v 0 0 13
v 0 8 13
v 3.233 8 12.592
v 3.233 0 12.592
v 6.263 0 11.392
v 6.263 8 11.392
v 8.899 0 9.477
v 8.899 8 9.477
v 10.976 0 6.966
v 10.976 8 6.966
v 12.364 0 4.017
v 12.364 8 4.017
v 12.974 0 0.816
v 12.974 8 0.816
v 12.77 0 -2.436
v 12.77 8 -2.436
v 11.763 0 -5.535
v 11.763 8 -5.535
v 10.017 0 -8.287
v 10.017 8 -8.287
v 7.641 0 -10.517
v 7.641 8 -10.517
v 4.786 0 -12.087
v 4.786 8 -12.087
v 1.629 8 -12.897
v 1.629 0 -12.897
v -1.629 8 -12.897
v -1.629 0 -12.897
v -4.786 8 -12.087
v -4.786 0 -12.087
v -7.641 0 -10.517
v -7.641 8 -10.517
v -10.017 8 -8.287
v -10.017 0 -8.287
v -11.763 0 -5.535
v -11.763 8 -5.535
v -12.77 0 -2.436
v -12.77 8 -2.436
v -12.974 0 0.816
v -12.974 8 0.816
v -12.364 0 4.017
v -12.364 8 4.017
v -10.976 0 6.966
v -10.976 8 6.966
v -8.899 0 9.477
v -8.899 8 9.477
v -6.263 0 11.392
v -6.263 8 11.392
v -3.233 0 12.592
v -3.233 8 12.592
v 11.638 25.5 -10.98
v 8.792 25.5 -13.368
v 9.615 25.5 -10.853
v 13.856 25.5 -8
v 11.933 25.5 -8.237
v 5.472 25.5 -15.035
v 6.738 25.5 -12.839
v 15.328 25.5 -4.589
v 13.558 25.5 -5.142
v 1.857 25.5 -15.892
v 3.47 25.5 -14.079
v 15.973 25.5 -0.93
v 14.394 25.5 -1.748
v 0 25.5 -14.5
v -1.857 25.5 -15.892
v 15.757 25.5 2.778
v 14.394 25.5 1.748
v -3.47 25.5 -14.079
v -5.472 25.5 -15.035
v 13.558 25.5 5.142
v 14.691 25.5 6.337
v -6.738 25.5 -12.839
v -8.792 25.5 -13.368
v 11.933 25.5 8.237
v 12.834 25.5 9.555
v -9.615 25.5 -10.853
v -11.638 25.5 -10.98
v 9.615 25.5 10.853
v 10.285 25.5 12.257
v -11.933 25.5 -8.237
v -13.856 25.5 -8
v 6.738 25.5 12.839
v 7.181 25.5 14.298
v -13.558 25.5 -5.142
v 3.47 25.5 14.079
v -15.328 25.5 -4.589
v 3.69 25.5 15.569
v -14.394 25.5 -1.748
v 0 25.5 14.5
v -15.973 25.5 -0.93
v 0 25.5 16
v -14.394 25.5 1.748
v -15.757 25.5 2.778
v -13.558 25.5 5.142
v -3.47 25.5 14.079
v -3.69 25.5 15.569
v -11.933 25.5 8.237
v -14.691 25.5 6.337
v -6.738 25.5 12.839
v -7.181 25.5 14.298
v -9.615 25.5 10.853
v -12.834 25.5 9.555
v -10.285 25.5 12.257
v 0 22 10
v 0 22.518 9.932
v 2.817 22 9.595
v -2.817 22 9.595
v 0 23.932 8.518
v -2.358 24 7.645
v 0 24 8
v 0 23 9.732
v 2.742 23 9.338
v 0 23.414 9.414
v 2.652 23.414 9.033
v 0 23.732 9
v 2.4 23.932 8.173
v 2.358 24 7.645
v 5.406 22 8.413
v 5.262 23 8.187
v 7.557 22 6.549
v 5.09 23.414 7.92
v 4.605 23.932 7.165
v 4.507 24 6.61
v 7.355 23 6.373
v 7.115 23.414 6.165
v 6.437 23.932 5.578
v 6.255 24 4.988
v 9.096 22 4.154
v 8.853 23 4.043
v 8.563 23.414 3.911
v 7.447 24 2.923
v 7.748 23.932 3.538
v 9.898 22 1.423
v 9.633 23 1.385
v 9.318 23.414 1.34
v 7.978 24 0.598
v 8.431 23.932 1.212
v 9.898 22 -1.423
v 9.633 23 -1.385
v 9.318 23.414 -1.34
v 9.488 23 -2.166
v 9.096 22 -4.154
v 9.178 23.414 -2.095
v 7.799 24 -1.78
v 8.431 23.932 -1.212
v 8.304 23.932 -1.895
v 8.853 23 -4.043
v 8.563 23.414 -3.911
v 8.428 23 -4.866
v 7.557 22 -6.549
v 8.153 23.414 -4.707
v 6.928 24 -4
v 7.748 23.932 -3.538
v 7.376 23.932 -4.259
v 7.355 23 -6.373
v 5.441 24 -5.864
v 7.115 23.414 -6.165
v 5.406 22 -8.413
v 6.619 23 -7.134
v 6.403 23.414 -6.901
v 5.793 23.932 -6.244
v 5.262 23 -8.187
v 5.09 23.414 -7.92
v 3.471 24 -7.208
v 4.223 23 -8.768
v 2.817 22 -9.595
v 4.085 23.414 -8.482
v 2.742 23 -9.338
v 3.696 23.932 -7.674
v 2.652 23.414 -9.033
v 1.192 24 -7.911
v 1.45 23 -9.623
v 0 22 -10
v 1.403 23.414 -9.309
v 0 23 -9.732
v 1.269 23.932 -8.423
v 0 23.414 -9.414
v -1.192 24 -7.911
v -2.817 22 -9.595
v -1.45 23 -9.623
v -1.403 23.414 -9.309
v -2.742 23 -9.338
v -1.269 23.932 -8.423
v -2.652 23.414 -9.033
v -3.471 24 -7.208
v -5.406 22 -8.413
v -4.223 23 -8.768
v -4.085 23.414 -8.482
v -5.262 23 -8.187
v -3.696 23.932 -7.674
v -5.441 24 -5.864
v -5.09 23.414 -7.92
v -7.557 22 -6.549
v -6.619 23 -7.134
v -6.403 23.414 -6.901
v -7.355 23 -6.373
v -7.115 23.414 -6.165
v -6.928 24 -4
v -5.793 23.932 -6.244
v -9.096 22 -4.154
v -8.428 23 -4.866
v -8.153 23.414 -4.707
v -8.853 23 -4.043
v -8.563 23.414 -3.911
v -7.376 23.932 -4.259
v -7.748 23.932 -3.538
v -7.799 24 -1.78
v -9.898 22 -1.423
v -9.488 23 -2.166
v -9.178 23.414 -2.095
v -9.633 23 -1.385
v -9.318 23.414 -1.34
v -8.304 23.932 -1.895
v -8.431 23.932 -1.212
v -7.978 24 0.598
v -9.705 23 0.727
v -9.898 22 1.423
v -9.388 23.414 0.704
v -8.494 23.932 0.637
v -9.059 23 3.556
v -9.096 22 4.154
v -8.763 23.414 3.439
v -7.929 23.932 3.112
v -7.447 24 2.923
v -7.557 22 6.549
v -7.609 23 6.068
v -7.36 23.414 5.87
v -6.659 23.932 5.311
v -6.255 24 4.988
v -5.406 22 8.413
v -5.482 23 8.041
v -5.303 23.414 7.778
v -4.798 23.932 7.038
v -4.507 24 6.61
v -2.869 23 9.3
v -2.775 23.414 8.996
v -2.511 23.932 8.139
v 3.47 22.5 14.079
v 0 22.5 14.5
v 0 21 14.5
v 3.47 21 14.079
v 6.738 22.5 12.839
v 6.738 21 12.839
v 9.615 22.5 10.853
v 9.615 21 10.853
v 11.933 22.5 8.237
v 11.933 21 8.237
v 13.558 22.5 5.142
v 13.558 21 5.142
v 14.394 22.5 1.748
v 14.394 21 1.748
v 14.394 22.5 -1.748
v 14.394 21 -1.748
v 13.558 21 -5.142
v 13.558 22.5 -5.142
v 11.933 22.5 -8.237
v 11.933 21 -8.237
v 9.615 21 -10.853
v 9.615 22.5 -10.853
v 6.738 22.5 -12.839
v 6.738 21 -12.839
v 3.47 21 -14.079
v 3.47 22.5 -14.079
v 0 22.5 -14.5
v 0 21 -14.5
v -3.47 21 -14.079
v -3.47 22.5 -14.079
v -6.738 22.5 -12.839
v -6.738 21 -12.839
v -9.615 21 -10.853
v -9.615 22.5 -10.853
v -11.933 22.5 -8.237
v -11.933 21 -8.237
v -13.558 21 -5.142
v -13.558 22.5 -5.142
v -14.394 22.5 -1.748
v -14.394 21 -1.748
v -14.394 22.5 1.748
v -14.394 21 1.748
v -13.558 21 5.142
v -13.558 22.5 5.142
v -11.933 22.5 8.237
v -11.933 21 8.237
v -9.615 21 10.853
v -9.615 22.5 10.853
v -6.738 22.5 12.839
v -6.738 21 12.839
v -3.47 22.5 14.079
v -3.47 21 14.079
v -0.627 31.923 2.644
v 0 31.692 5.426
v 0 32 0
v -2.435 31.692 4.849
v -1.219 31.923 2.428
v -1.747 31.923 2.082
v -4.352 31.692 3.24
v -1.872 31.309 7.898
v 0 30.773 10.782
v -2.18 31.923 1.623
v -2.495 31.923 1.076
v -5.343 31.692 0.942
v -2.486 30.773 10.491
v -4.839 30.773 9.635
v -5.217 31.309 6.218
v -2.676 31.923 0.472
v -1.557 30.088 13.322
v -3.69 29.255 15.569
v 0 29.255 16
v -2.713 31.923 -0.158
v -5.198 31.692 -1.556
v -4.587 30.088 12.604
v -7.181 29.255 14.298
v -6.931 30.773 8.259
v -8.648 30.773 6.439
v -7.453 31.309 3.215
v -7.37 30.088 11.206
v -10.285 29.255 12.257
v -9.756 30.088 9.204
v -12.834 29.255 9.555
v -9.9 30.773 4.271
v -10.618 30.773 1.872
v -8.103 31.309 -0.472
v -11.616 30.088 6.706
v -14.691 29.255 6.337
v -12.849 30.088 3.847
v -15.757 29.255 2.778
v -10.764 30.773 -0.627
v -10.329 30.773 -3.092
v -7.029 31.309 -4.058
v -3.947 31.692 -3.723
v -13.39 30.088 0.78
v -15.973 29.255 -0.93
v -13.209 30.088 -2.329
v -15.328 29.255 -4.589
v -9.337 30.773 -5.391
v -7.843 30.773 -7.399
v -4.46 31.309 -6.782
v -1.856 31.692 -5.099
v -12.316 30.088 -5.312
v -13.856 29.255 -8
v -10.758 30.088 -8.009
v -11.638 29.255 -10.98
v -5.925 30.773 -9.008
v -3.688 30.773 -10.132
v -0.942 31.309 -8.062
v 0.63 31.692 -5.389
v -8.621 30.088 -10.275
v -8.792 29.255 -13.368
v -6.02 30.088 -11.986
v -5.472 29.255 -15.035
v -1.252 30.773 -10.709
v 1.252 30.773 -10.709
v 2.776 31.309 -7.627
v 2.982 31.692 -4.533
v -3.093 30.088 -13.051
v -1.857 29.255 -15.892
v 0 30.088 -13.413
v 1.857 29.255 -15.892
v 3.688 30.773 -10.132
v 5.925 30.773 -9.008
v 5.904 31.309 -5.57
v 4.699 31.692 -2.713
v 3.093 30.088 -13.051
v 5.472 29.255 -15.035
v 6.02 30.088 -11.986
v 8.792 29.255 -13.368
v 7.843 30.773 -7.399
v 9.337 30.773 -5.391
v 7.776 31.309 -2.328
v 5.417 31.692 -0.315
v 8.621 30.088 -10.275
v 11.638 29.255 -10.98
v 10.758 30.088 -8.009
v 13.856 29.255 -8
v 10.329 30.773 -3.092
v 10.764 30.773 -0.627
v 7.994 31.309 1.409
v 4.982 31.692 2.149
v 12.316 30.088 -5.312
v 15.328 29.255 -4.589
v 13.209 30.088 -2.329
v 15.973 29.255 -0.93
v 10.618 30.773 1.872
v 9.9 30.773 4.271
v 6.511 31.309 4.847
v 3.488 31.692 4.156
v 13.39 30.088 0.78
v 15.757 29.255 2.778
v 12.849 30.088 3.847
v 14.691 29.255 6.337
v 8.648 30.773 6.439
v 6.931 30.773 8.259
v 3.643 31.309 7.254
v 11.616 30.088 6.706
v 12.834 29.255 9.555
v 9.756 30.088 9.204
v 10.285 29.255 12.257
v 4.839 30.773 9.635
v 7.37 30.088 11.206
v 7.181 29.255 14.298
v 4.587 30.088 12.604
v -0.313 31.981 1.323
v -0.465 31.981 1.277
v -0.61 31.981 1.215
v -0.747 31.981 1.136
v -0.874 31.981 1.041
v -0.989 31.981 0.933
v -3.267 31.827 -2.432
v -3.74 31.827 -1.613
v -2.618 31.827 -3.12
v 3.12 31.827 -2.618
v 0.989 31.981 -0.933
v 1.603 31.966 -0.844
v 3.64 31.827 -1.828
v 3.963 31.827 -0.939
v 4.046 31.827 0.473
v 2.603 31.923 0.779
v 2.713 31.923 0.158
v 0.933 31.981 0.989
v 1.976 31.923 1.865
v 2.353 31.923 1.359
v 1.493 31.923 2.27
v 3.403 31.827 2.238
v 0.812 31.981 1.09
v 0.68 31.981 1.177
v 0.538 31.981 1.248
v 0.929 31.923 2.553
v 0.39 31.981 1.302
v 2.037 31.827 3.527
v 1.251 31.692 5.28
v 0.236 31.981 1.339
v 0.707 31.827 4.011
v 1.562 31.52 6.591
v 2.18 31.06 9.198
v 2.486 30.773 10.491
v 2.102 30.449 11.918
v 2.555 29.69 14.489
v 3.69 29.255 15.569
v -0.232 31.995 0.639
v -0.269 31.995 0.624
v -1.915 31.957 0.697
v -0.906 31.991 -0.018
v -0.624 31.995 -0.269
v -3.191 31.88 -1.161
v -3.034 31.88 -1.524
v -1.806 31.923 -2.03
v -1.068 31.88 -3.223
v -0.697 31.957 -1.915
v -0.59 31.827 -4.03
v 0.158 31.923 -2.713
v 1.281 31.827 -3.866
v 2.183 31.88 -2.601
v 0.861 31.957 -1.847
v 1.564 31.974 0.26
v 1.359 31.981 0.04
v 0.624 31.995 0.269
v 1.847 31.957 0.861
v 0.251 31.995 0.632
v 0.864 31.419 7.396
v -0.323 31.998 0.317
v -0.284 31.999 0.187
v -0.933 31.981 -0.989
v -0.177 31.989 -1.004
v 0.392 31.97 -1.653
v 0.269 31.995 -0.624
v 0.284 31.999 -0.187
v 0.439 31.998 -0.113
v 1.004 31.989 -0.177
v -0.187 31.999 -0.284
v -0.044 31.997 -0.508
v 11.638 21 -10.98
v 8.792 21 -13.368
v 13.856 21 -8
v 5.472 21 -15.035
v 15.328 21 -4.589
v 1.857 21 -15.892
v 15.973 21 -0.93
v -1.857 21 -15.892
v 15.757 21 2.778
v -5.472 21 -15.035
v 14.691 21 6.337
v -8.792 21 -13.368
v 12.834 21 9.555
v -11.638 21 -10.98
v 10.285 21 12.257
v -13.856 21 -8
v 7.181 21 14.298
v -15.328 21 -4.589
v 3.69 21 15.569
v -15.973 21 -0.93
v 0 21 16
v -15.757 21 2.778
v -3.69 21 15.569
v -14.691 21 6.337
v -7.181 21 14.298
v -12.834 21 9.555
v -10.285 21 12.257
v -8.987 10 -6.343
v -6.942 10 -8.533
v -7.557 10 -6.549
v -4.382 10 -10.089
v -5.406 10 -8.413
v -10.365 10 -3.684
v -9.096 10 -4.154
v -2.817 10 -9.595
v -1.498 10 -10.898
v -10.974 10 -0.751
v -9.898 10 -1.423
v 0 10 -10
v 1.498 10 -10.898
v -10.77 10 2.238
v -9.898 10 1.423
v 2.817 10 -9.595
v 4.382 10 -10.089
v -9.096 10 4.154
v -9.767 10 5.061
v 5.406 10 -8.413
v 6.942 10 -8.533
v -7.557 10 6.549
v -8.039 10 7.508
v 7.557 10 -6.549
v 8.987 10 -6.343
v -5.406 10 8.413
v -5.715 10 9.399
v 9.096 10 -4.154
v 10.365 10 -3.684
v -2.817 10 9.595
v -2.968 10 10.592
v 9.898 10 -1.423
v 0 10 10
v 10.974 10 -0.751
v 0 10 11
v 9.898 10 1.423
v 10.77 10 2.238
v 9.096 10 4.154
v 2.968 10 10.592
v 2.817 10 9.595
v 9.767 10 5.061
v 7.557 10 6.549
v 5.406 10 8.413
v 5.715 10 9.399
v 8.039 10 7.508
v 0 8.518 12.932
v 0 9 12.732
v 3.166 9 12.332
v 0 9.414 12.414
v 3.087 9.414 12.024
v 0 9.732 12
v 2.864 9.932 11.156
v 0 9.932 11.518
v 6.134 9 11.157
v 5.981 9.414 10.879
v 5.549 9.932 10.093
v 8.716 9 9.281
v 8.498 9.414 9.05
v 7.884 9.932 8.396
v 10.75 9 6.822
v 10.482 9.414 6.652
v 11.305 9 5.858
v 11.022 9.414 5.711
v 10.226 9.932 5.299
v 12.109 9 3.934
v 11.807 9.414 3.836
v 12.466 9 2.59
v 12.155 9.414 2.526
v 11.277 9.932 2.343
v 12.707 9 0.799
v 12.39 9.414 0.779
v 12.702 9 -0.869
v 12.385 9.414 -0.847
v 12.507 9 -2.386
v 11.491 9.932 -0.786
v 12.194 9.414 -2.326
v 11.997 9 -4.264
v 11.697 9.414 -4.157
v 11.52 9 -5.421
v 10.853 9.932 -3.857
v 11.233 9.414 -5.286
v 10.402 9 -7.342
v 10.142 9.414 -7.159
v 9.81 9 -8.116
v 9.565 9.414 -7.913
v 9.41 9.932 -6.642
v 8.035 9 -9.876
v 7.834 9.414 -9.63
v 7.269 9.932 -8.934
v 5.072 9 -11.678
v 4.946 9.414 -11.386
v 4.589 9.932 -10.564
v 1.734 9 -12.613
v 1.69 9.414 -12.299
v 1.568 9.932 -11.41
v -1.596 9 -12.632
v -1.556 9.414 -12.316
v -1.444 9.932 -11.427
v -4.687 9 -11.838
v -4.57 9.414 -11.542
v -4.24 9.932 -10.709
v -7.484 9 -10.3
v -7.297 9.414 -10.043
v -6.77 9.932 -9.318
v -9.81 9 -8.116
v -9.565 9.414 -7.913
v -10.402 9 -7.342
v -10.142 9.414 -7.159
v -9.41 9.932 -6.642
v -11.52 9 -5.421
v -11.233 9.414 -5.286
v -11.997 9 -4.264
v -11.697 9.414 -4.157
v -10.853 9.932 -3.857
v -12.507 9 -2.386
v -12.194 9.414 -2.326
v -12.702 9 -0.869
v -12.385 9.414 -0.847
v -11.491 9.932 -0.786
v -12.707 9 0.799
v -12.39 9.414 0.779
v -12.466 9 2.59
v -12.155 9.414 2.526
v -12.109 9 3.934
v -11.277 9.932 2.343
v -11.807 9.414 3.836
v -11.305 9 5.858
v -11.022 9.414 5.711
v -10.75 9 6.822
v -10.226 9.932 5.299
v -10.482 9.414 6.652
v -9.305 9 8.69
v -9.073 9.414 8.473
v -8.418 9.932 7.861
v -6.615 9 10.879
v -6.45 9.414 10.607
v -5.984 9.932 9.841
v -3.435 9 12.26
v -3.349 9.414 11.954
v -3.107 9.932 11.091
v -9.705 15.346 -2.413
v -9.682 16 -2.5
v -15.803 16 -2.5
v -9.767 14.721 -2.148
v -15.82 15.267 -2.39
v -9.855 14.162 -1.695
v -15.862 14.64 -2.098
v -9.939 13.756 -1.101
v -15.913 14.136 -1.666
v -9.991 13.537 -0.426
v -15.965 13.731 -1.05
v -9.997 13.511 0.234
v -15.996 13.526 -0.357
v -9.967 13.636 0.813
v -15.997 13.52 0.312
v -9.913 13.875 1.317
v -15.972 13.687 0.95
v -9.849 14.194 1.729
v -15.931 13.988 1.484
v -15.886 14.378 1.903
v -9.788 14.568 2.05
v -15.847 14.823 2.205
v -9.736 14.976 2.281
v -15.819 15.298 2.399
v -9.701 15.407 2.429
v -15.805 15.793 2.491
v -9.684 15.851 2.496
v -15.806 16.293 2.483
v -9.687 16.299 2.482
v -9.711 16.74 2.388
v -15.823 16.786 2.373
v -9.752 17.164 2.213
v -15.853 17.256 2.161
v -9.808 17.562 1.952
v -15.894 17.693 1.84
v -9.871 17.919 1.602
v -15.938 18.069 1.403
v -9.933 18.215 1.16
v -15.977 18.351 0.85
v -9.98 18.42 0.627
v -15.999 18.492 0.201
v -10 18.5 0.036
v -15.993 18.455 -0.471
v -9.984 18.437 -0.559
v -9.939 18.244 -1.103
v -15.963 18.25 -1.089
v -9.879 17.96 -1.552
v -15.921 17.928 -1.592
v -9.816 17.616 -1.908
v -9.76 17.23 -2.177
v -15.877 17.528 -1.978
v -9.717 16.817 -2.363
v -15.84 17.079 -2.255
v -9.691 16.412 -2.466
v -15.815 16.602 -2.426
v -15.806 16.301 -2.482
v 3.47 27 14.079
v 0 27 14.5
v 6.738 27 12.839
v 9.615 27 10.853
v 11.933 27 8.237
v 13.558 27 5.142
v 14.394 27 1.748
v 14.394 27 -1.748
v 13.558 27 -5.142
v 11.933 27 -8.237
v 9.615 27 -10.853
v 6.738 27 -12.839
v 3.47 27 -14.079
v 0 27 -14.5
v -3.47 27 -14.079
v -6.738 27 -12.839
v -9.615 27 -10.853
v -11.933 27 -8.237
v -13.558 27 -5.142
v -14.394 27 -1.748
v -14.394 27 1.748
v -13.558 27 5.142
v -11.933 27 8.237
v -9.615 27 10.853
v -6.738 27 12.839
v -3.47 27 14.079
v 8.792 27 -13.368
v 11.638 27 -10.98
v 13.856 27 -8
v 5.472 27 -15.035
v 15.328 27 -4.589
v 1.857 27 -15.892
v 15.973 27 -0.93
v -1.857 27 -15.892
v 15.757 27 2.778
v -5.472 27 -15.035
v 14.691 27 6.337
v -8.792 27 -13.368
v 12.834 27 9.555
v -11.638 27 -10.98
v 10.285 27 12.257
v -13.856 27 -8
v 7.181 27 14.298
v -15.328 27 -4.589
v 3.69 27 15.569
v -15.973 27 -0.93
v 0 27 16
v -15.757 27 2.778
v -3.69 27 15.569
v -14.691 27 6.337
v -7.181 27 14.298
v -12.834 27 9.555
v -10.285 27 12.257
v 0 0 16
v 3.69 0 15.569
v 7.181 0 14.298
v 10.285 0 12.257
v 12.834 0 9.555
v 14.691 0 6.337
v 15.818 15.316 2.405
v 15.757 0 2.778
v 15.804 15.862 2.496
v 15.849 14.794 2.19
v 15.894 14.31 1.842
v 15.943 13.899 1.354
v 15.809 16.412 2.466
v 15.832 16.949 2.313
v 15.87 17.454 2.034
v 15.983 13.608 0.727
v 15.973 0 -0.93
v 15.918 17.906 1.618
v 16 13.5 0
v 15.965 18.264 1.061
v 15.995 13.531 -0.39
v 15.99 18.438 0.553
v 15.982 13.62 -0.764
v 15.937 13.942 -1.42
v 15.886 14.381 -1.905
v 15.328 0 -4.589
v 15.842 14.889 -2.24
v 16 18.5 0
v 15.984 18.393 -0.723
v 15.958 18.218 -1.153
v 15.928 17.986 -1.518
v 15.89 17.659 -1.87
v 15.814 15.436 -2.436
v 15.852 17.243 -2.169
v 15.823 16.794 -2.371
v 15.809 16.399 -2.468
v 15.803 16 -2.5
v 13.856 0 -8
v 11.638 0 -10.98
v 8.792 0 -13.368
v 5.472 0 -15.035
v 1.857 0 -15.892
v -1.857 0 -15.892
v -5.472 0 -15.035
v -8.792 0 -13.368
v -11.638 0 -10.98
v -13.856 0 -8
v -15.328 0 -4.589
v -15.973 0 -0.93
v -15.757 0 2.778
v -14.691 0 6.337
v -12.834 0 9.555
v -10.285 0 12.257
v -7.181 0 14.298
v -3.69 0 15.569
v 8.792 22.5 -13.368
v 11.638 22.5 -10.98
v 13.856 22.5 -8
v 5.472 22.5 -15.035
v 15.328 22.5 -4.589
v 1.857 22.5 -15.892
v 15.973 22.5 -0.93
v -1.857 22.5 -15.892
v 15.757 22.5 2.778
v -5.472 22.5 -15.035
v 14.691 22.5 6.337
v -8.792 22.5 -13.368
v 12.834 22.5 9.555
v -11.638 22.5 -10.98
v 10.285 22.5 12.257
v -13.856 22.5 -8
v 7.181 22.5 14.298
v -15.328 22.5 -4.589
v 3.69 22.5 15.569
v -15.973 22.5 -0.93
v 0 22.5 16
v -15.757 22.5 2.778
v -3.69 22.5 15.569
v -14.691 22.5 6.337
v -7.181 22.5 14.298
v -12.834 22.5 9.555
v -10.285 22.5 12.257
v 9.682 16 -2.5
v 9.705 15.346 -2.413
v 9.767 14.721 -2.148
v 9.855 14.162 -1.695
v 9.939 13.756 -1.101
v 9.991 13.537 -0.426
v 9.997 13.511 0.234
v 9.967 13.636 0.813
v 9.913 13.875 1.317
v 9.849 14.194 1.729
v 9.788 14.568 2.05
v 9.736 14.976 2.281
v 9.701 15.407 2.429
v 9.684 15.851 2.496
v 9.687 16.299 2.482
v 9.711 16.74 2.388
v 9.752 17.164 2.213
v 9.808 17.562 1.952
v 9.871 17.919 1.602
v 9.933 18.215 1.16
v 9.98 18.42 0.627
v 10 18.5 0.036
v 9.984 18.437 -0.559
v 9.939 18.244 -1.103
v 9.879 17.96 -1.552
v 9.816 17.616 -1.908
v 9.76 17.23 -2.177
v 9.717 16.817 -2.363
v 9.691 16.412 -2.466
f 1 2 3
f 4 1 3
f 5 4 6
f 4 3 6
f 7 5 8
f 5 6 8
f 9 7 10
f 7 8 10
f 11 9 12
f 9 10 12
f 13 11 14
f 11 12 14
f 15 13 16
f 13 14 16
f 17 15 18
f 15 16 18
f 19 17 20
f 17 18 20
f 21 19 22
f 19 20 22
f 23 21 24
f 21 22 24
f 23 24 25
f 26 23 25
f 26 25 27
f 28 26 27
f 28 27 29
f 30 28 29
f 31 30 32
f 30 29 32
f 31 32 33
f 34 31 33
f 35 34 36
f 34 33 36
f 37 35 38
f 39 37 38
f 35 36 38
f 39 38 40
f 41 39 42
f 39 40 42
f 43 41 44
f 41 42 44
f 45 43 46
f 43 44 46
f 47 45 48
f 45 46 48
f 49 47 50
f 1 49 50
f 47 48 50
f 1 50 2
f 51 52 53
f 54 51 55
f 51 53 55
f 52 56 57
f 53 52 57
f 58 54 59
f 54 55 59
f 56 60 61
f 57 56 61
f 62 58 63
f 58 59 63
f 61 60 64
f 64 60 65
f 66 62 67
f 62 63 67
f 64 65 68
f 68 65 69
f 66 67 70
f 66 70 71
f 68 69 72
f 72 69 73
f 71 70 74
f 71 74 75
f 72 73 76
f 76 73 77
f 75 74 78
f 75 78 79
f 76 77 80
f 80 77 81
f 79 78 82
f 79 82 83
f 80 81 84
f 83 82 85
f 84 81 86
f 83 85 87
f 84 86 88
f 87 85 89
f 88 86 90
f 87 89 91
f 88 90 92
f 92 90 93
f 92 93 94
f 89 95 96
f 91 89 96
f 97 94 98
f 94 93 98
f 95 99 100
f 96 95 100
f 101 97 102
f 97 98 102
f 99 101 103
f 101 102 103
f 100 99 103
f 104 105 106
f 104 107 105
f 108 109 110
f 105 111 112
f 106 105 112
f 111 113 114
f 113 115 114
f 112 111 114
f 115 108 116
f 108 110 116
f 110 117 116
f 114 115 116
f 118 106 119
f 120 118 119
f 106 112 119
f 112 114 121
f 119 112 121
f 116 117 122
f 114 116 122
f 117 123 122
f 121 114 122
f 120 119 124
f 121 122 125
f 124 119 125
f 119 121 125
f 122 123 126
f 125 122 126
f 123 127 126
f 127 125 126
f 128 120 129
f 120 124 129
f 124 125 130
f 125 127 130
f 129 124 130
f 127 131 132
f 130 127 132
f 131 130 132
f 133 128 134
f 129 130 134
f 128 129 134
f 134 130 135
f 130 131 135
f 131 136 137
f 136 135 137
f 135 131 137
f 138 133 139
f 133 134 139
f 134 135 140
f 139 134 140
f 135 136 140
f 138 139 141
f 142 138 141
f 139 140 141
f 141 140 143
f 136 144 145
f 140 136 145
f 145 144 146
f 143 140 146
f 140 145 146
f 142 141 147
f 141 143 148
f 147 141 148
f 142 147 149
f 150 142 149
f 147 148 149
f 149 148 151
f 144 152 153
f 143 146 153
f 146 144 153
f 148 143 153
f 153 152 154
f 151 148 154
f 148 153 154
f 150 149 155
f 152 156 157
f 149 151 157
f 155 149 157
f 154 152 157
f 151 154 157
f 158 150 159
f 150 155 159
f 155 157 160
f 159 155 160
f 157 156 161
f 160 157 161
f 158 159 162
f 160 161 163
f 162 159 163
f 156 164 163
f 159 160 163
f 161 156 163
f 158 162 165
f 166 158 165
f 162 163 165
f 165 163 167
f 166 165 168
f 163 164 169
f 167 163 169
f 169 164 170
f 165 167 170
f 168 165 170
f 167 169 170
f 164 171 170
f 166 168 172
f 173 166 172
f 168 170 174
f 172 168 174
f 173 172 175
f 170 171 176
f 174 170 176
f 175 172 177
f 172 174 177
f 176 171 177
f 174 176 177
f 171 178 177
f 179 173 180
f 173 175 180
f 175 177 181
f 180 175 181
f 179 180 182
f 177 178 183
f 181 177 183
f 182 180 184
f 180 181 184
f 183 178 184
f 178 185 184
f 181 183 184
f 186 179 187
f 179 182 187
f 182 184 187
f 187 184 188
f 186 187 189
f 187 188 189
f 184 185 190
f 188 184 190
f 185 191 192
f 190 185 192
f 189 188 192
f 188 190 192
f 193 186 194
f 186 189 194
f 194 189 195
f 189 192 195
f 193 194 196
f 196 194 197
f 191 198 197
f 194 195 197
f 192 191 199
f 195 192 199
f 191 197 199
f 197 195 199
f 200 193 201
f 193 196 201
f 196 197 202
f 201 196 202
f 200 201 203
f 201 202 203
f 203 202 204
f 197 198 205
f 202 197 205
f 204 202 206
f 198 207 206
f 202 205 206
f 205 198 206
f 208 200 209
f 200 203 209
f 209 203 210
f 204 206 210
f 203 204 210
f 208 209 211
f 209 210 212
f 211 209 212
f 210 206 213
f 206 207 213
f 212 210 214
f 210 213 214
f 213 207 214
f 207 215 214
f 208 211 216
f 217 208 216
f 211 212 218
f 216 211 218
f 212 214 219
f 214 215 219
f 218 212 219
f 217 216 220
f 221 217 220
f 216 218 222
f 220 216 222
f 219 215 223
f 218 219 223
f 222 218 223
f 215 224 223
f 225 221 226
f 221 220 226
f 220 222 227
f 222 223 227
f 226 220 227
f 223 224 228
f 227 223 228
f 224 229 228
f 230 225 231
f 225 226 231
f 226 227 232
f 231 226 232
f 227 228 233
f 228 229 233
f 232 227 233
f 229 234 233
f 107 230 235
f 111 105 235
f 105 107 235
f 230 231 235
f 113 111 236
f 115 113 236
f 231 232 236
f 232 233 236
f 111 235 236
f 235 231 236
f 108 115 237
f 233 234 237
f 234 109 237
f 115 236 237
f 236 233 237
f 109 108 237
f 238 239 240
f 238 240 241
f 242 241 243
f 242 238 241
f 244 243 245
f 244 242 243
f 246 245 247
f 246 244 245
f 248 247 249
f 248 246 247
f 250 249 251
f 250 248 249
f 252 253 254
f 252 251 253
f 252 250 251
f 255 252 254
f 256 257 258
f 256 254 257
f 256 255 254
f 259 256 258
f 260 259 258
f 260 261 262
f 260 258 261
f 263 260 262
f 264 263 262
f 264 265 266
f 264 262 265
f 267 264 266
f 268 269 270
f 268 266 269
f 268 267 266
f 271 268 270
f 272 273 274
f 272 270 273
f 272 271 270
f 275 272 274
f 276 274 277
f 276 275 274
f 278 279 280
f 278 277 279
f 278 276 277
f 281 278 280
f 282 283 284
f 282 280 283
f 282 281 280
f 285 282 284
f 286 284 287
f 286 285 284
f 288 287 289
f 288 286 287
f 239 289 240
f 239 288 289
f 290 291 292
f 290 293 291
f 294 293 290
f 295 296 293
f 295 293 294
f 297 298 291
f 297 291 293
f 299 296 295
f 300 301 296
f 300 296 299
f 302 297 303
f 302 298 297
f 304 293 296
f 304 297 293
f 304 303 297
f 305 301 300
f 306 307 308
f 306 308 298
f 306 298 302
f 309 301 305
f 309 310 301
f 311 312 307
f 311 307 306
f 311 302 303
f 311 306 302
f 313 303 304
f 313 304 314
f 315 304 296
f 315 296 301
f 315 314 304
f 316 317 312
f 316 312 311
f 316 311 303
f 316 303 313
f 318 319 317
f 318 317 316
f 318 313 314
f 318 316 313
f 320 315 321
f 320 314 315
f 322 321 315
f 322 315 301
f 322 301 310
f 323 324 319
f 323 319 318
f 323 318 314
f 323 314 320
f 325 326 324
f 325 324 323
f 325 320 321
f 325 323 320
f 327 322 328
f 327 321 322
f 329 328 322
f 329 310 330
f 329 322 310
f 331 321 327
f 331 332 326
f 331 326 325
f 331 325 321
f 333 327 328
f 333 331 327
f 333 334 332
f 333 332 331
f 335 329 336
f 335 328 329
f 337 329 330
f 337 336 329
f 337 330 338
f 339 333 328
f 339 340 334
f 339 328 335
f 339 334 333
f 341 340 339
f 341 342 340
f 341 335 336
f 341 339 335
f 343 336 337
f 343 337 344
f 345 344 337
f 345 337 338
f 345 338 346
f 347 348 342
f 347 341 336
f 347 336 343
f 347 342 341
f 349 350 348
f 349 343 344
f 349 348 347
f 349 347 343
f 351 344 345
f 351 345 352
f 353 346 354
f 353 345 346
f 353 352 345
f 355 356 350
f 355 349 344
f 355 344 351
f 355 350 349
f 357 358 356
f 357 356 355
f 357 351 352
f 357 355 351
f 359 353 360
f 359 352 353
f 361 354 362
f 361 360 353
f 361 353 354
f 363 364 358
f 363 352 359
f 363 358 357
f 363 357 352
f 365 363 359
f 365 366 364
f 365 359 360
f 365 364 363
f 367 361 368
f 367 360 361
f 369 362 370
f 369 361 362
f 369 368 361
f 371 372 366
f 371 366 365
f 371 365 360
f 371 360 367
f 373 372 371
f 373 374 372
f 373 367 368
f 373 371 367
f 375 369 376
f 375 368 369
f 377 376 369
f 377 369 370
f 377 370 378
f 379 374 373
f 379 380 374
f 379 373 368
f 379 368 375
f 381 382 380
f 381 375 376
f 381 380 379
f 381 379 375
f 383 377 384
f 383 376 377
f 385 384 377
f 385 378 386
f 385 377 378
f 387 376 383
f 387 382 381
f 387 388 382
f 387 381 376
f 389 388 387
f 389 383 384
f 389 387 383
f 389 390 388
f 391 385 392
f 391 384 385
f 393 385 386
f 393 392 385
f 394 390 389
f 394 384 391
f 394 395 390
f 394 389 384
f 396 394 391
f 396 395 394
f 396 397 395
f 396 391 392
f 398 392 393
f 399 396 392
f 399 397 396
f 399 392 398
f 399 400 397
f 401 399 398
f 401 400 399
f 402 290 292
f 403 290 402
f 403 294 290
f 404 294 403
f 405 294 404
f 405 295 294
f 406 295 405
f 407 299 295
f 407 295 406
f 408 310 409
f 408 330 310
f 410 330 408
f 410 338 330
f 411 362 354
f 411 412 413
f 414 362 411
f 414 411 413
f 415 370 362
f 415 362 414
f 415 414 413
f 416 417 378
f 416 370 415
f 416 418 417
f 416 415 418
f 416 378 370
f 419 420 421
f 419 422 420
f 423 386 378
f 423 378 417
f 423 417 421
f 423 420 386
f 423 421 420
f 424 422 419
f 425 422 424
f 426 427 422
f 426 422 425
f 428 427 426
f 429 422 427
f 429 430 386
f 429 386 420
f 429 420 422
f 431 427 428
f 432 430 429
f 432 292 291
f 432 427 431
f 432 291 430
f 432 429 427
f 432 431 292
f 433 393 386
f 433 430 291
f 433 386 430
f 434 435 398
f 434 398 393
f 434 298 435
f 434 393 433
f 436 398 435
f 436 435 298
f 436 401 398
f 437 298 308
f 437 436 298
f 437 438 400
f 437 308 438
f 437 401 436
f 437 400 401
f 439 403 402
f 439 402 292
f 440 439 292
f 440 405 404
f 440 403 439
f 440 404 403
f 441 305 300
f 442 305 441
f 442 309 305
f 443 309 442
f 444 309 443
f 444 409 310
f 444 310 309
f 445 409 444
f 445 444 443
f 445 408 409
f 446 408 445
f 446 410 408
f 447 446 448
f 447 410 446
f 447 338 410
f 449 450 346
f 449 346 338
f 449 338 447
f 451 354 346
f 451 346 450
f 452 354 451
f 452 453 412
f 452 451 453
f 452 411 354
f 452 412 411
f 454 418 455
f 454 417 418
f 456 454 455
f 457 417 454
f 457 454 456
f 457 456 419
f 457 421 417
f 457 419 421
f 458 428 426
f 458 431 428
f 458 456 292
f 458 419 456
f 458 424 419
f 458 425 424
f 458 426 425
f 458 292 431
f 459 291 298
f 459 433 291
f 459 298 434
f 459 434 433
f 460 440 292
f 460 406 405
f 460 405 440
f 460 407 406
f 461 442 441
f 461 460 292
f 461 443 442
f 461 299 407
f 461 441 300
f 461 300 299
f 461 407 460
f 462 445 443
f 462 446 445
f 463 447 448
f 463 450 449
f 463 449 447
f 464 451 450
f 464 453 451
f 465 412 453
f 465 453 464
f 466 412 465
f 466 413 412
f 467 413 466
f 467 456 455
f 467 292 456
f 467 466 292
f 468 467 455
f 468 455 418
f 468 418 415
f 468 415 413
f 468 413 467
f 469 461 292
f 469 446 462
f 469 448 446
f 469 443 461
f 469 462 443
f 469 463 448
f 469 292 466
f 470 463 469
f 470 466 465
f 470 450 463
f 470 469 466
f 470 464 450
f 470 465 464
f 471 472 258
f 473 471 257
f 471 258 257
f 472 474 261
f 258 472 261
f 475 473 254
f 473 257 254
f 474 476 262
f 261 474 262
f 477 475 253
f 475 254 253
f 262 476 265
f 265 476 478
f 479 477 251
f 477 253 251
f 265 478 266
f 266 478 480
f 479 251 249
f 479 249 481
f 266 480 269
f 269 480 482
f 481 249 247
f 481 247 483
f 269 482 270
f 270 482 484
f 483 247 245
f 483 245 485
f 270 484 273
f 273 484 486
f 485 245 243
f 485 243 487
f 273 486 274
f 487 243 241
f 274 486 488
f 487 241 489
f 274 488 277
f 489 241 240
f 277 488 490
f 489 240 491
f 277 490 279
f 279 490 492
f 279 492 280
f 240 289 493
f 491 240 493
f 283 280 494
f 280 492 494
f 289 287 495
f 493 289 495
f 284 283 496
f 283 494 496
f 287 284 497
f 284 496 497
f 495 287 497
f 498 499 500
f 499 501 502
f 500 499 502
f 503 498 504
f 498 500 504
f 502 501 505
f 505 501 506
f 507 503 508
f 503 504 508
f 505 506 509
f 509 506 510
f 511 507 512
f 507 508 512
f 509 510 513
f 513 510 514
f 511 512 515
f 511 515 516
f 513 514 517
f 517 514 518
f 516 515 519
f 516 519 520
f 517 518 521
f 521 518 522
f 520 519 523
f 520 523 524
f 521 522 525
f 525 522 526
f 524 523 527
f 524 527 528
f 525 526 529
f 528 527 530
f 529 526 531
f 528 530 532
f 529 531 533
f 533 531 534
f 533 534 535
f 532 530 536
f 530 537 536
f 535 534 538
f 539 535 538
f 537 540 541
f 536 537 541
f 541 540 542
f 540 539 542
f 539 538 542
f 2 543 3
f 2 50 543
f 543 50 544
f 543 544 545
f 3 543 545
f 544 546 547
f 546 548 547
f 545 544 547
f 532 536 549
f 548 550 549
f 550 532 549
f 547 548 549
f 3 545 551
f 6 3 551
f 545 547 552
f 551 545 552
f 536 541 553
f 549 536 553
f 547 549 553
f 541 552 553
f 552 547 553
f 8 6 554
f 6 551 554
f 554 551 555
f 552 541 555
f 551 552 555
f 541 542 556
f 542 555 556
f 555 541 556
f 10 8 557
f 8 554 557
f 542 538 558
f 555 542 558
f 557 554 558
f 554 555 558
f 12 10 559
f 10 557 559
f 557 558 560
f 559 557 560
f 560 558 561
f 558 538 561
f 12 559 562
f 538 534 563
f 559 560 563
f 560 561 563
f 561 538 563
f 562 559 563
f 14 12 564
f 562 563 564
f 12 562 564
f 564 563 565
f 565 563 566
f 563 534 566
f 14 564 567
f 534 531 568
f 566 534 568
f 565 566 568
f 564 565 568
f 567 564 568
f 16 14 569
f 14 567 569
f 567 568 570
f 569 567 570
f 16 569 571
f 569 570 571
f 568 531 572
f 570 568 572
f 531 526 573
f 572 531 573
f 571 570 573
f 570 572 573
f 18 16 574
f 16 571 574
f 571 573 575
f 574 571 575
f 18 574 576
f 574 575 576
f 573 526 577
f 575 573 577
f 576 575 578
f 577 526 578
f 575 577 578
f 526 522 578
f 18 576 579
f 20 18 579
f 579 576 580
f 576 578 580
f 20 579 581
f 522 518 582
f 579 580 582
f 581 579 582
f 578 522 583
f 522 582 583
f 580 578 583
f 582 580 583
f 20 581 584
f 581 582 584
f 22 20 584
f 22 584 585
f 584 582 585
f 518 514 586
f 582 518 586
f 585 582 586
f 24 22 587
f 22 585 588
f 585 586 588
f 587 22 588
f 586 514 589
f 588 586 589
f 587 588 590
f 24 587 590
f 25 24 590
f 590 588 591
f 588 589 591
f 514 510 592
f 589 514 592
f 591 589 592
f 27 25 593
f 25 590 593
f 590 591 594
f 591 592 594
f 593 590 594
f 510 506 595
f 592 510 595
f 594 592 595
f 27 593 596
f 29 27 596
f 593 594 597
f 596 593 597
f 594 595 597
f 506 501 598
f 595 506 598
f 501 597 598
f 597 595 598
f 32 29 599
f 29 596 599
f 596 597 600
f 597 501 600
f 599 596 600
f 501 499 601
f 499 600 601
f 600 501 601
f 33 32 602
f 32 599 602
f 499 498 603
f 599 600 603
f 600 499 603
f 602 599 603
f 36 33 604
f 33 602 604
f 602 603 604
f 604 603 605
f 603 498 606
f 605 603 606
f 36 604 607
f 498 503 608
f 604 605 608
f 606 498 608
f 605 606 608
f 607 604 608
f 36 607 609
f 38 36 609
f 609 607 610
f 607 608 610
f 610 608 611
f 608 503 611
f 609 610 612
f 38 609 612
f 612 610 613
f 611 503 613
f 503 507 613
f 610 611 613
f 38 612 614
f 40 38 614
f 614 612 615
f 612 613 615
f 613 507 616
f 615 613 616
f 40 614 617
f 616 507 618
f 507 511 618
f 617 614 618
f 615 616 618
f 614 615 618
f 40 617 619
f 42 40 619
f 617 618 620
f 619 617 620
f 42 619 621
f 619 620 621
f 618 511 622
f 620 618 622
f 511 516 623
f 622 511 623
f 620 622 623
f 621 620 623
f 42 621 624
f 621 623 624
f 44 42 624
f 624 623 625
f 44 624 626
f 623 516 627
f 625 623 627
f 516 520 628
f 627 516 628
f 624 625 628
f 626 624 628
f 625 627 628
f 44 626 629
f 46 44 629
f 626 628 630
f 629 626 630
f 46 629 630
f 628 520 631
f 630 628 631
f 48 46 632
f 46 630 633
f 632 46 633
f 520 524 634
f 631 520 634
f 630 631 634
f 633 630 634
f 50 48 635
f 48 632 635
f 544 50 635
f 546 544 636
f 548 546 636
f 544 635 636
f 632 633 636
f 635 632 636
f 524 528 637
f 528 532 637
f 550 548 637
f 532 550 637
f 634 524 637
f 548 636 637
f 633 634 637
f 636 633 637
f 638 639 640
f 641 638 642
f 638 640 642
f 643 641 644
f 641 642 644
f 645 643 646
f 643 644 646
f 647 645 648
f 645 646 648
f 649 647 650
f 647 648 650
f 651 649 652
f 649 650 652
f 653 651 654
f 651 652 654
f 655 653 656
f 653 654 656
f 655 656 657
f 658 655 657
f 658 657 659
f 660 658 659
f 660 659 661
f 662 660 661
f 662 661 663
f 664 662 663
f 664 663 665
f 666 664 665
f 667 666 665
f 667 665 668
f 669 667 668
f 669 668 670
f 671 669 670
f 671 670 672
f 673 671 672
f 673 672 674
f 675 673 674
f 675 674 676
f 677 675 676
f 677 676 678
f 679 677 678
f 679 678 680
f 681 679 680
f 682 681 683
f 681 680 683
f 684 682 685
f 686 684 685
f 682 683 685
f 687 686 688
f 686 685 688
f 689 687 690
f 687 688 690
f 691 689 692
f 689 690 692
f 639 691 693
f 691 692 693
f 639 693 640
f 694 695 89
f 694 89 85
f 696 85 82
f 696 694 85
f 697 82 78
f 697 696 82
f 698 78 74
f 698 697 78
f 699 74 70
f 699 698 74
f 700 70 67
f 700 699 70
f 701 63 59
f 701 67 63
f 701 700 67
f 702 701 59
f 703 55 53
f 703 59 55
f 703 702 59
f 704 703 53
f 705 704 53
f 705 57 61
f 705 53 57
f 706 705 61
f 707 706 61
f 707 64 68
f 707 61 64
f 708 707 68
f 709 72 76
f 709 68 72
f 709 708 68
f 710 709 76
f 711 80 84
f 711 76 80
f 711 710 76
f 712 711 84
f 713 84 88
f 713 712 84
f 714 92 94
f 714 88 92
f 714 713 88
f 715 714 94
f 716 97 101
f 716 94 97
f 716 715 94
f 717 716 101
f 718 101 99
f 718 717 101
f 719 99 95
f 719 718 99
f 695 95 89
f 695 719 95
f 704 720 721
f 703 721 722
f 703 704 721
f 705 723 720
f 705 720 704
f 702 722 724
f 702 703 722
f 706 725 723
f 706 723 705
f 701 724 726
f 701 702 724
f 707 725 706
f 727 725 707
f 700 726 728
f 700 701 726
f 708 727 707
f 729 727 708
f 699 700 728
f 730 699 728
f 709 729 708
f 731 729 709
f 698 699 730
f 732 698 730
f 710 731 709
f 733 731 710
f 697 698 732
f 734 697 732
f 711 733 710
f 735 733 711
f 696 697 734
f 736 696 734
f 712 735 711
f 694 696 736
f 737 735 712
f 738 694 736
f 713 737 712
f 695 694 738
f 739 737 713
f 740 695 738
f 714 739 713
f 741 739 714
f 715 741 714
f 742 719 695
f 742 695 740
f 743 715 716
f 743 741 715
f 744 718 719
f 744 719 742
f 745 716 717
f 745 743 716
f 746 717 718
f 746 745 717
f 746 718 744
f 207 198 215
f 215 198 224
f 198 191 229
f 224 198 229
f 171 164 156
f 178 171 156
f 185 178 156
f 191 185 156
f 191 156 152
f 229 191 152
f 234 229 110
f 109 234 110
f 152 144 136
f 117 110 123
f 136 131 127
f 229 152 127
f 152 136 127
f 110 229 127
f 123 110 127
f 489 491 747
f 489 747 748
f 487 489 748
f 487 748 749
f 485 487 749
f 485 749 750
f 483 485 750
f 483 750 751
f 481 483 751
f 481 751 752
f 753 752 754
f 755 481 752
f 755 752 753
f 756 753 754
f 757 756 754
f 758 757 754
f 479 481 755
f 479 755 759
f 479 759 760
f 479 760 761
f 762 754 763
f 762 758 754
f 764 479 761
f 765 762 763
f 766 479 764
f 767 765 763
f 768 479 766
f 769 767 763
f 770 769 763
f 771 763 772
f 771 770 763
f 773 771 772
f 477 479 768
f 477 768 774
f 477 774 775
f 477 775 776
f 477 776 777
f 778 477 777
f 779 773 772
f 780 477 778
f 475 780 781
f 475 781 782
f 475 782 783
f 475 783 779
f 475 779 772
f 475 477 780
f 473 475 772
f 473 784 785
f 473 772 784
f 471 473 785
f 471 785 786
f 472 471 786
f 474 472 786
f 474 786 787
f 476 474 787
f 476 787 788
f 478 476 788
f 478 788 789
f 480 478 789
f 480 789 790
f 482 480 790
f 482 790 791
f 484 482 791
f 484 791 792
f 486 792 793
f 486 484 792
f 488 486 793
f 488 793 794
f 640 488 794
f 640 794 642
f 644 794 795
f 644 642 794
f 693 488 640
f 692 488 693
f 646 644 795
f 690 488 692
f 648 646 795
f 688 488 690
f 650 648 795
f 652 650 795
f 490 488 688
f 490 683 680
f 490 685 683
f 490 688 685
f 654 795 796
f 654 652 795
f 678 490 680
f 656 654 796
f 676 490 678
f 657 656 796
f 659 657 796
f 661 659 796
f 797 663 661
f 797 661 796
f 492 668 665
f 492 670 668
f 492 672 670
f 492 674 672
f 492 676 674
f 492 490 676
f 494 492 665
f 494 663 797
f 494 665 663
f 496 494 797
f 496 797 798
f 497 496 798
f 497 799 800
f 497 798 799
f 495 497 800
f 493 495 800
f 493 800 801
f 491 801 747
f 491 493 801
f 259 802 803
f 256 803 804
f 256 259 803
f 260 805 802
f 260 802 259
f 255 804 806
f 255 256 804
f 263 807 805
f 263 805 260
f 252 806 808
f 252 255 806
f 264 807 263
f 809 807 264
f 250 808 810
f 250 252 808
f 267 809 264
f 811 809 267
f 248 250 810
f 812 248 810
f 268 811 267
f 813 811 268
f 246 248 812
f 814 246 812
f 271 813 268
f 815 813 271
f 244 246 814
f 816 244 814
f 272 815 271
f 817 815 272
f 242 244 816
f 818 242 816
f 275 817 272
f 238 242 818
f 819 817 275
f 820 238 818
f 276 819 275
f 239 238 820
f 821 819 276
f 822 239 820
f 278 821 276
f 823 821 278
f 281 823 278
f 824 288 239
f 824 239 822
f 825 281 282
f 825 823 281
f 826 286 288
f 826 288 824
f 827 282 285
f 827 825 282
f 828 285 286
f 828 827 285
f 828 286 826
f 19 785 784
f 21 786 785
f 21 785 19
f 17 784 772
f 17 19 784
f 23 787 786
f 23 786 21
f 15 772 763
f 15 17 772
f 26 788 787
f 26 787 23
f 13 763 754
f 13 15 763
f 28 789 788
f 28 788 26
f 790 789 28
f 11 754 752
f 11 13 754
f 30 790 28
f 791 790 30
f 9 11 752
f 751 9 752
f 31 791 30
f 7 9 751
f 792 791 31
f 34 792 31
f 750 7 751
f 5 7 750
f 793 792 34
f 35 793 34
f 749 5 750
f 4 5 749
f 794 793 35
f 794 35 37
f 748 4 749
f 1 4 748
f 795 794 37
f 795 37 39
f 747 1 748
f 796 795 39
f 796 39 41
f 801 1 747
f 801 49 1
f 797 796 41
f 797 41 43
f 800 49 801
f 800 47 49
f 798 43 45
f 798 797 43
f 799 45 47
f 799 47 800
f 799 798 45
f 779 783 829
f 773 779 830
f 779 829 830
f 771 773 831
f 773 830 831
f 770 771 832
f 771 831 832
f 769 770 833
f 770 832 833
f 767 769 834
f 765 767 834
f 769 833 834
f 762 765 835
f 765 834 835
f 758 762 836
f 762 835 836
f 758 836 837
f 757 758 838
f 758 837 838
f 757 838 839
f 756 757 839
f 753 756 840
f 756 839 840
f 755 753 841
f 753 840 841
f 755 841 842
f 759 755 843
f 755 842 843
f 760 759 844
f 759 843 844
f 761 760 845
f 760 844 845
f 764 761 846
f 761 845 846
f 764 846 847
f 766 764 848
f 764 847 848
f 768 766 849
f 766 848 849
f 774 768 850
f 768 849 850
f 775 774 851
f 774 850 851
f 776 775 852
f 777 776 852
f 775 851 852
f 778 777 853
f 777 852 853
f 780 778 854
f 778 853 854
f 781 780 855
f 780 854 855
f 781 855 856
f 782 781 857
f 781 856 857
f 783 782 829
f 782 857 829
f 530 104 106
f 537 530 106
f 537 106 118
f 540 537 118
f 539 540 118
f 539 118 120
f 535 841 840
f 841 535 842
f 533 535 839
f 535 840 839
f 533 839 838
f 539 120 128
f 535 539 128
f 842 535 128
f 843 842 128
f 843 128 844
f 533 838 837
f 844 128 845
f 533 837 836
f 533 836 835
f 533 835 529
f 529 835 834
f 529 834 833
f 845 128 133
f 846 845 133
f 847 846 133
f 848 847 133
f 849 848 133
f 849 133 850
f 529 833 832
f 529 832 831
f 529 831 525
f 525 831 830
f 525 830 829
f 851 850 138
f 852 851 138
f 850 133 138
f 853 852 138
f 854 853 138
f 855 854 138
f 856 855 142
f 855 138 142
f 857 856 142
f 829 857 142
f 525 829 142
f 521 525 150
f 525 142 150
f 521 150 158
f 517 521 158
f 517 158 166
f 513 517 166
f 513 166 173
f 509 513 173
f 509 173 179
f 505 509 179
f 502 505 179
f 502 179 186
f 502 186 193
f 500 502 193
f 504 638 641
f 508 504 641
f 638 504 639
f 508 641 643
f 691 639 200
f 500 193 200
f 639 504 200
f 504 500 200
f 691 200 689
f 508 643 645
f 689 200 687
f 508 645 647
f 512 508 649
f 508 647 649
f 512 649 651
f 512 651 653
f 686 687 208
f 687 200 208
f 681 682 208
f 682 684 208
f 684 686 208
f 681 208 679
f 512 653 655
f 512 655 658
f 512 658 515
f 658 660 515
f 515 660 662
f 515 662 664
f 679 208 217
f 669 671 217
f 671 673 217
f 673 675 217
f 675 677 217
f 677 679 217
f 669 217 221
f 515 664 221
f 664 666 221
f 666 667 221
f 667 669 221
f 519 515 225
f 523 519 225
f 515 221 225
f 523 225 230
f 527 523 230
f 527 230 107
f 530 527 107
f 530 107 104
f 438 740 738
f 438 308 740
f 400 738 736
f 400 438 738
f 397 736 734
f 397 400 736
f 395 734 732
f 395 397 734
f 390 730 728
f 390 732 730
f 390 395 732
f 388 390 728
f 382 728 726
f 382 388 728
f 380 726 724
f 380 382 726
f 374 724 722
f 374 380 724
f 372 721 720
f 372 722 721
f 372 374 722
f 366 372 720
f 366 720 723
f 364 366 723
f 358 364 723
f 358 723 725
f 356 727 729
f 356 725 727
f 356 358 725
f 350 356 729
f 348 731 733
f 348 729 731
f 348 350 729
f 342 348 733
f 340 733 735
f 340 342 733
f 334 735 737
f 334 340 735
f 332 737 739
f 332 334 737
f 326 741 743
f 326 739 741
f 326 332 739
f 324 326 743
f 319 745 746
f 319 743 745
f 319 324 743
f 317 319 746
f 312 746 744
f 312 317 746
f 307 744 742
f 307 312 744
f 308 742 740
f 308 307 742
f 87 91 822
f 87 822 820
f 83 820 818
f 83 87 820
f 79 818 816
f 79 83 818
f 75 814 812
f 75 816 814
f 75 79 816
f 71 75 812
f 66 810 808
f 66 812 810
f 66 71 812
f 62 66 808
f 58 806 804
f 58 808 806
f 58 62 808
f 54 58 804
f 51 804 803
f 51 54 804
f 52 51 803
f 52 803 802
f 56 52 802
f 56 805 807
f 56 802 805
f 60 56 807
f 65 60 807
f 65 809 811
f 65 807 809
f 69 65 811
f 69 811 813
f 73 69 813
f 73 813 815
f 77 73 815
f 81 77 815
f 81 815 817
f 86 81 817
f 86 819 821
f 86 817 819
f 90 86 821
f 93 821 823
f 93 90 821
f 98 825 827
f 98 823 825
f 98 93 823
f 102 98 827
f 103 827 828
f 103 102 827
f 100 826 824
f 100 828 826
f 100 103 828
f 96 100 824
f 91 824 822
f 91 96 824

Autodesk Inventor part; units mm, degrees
ref_plane "XZ Plane" through (0, 0, 0) normal (0, 1, 0) x (-1, 0, 0)
ref_plane "XY Plane" through (0, 0, 0) normal (0, 0, 1) x (1, 0, 0)
sketch "Náčrt3" plane through (0, 0, 0) normal (1, 0, 0) x (0, 1, 0)
  line L0 (0, 0) -> (0, 16)
  line L1 (0, 16) -> (21, 16)
  line L2 (21, 16) -> (21, 14.5)
  line L3 (21, 14.5) -> (22.5, 14.5)
  line L4 (22.5, 14.5) -> (22.5, 16)
  line L5 (22.5, 16) -> (25.5, 16)
  line L6 (25.5, 16) -> (25.5, 14.5)
  line L7 (25.5, 14.5) -> (27, 14.5)
  line L8 (27, 14.5) -> (27, 16)
  line L9 (27, 16) -> (29.2548, 16)
  line L10 (32, 0) -> (0, 0)
  arc A0 (32, 0) -> (29.2548, 16) centre (-16, 0) ccw
  dimension "d4" = 16
  dimension "d5" = 21
  dimension "d6" = 3
  dimension "d7" = 1.5
  dimension "d8" = 1.5
  dimension "d9" = 14.5
  dimension "d12" = 96
  dimension "d13" = 32
revolve "Rotace1" add sketch "Náčrt3" angle 360 about axis through (0, 32, 0) along (0, -1, 0)
sketch "Náčrt4" plane through (0, 0, 0) normal (1, 0, 0) x (0, 1, 0)
  line L0 (0, 16) -> (0, -16) projected
  line L1 (0, 13) -> (10, 13)
  line L2 (10, 13) -> (10, 10)
  line L3 (20.5263, 0) -> (0, 0)
  line L4 (10, 10) -> (24, 10)
  line L5 (24, 10) -> (24, 0)
  line L6 (24, 0) -> (20.5263, 0)
  line L7 (-6.4, 0) -> (38.4, 0) projected
  dimension "d14" = 10
  dimension "d15" = 13
  dimension "d16" = 10
  dimension "d17" = 24
revolve "Rotace2" cut sketch "Náčrt4" angle 360 about axis through (0, -10, 0) along (0, 1, 0)
fillet "Zaoblení1" radius 2 2 edges at (0, 10, -13) (0, 24, -10)
ref_plane "Pracovní rovina1" through (16, 0, 0) normal (1, 0, 0) x (0, 1, 0)
sketch "Náčrt5" plane through (16, 0, 0) normal (1, 0, 0) x (0, 1, 0)
  line L0 (-6.4, 0) -> (38.4, 0) projected
  line L1 (0, -22.4) -> (0, 22.4) projected
  point P0 (0, 0)
  point P1 (16, 0)
  dimension "d21" = 16
hole "Díra1" at (16, 16, 0) direction (-1, 0, 0) diameter 5 end through all
properties part number "Piston_head" material "Ocel"
